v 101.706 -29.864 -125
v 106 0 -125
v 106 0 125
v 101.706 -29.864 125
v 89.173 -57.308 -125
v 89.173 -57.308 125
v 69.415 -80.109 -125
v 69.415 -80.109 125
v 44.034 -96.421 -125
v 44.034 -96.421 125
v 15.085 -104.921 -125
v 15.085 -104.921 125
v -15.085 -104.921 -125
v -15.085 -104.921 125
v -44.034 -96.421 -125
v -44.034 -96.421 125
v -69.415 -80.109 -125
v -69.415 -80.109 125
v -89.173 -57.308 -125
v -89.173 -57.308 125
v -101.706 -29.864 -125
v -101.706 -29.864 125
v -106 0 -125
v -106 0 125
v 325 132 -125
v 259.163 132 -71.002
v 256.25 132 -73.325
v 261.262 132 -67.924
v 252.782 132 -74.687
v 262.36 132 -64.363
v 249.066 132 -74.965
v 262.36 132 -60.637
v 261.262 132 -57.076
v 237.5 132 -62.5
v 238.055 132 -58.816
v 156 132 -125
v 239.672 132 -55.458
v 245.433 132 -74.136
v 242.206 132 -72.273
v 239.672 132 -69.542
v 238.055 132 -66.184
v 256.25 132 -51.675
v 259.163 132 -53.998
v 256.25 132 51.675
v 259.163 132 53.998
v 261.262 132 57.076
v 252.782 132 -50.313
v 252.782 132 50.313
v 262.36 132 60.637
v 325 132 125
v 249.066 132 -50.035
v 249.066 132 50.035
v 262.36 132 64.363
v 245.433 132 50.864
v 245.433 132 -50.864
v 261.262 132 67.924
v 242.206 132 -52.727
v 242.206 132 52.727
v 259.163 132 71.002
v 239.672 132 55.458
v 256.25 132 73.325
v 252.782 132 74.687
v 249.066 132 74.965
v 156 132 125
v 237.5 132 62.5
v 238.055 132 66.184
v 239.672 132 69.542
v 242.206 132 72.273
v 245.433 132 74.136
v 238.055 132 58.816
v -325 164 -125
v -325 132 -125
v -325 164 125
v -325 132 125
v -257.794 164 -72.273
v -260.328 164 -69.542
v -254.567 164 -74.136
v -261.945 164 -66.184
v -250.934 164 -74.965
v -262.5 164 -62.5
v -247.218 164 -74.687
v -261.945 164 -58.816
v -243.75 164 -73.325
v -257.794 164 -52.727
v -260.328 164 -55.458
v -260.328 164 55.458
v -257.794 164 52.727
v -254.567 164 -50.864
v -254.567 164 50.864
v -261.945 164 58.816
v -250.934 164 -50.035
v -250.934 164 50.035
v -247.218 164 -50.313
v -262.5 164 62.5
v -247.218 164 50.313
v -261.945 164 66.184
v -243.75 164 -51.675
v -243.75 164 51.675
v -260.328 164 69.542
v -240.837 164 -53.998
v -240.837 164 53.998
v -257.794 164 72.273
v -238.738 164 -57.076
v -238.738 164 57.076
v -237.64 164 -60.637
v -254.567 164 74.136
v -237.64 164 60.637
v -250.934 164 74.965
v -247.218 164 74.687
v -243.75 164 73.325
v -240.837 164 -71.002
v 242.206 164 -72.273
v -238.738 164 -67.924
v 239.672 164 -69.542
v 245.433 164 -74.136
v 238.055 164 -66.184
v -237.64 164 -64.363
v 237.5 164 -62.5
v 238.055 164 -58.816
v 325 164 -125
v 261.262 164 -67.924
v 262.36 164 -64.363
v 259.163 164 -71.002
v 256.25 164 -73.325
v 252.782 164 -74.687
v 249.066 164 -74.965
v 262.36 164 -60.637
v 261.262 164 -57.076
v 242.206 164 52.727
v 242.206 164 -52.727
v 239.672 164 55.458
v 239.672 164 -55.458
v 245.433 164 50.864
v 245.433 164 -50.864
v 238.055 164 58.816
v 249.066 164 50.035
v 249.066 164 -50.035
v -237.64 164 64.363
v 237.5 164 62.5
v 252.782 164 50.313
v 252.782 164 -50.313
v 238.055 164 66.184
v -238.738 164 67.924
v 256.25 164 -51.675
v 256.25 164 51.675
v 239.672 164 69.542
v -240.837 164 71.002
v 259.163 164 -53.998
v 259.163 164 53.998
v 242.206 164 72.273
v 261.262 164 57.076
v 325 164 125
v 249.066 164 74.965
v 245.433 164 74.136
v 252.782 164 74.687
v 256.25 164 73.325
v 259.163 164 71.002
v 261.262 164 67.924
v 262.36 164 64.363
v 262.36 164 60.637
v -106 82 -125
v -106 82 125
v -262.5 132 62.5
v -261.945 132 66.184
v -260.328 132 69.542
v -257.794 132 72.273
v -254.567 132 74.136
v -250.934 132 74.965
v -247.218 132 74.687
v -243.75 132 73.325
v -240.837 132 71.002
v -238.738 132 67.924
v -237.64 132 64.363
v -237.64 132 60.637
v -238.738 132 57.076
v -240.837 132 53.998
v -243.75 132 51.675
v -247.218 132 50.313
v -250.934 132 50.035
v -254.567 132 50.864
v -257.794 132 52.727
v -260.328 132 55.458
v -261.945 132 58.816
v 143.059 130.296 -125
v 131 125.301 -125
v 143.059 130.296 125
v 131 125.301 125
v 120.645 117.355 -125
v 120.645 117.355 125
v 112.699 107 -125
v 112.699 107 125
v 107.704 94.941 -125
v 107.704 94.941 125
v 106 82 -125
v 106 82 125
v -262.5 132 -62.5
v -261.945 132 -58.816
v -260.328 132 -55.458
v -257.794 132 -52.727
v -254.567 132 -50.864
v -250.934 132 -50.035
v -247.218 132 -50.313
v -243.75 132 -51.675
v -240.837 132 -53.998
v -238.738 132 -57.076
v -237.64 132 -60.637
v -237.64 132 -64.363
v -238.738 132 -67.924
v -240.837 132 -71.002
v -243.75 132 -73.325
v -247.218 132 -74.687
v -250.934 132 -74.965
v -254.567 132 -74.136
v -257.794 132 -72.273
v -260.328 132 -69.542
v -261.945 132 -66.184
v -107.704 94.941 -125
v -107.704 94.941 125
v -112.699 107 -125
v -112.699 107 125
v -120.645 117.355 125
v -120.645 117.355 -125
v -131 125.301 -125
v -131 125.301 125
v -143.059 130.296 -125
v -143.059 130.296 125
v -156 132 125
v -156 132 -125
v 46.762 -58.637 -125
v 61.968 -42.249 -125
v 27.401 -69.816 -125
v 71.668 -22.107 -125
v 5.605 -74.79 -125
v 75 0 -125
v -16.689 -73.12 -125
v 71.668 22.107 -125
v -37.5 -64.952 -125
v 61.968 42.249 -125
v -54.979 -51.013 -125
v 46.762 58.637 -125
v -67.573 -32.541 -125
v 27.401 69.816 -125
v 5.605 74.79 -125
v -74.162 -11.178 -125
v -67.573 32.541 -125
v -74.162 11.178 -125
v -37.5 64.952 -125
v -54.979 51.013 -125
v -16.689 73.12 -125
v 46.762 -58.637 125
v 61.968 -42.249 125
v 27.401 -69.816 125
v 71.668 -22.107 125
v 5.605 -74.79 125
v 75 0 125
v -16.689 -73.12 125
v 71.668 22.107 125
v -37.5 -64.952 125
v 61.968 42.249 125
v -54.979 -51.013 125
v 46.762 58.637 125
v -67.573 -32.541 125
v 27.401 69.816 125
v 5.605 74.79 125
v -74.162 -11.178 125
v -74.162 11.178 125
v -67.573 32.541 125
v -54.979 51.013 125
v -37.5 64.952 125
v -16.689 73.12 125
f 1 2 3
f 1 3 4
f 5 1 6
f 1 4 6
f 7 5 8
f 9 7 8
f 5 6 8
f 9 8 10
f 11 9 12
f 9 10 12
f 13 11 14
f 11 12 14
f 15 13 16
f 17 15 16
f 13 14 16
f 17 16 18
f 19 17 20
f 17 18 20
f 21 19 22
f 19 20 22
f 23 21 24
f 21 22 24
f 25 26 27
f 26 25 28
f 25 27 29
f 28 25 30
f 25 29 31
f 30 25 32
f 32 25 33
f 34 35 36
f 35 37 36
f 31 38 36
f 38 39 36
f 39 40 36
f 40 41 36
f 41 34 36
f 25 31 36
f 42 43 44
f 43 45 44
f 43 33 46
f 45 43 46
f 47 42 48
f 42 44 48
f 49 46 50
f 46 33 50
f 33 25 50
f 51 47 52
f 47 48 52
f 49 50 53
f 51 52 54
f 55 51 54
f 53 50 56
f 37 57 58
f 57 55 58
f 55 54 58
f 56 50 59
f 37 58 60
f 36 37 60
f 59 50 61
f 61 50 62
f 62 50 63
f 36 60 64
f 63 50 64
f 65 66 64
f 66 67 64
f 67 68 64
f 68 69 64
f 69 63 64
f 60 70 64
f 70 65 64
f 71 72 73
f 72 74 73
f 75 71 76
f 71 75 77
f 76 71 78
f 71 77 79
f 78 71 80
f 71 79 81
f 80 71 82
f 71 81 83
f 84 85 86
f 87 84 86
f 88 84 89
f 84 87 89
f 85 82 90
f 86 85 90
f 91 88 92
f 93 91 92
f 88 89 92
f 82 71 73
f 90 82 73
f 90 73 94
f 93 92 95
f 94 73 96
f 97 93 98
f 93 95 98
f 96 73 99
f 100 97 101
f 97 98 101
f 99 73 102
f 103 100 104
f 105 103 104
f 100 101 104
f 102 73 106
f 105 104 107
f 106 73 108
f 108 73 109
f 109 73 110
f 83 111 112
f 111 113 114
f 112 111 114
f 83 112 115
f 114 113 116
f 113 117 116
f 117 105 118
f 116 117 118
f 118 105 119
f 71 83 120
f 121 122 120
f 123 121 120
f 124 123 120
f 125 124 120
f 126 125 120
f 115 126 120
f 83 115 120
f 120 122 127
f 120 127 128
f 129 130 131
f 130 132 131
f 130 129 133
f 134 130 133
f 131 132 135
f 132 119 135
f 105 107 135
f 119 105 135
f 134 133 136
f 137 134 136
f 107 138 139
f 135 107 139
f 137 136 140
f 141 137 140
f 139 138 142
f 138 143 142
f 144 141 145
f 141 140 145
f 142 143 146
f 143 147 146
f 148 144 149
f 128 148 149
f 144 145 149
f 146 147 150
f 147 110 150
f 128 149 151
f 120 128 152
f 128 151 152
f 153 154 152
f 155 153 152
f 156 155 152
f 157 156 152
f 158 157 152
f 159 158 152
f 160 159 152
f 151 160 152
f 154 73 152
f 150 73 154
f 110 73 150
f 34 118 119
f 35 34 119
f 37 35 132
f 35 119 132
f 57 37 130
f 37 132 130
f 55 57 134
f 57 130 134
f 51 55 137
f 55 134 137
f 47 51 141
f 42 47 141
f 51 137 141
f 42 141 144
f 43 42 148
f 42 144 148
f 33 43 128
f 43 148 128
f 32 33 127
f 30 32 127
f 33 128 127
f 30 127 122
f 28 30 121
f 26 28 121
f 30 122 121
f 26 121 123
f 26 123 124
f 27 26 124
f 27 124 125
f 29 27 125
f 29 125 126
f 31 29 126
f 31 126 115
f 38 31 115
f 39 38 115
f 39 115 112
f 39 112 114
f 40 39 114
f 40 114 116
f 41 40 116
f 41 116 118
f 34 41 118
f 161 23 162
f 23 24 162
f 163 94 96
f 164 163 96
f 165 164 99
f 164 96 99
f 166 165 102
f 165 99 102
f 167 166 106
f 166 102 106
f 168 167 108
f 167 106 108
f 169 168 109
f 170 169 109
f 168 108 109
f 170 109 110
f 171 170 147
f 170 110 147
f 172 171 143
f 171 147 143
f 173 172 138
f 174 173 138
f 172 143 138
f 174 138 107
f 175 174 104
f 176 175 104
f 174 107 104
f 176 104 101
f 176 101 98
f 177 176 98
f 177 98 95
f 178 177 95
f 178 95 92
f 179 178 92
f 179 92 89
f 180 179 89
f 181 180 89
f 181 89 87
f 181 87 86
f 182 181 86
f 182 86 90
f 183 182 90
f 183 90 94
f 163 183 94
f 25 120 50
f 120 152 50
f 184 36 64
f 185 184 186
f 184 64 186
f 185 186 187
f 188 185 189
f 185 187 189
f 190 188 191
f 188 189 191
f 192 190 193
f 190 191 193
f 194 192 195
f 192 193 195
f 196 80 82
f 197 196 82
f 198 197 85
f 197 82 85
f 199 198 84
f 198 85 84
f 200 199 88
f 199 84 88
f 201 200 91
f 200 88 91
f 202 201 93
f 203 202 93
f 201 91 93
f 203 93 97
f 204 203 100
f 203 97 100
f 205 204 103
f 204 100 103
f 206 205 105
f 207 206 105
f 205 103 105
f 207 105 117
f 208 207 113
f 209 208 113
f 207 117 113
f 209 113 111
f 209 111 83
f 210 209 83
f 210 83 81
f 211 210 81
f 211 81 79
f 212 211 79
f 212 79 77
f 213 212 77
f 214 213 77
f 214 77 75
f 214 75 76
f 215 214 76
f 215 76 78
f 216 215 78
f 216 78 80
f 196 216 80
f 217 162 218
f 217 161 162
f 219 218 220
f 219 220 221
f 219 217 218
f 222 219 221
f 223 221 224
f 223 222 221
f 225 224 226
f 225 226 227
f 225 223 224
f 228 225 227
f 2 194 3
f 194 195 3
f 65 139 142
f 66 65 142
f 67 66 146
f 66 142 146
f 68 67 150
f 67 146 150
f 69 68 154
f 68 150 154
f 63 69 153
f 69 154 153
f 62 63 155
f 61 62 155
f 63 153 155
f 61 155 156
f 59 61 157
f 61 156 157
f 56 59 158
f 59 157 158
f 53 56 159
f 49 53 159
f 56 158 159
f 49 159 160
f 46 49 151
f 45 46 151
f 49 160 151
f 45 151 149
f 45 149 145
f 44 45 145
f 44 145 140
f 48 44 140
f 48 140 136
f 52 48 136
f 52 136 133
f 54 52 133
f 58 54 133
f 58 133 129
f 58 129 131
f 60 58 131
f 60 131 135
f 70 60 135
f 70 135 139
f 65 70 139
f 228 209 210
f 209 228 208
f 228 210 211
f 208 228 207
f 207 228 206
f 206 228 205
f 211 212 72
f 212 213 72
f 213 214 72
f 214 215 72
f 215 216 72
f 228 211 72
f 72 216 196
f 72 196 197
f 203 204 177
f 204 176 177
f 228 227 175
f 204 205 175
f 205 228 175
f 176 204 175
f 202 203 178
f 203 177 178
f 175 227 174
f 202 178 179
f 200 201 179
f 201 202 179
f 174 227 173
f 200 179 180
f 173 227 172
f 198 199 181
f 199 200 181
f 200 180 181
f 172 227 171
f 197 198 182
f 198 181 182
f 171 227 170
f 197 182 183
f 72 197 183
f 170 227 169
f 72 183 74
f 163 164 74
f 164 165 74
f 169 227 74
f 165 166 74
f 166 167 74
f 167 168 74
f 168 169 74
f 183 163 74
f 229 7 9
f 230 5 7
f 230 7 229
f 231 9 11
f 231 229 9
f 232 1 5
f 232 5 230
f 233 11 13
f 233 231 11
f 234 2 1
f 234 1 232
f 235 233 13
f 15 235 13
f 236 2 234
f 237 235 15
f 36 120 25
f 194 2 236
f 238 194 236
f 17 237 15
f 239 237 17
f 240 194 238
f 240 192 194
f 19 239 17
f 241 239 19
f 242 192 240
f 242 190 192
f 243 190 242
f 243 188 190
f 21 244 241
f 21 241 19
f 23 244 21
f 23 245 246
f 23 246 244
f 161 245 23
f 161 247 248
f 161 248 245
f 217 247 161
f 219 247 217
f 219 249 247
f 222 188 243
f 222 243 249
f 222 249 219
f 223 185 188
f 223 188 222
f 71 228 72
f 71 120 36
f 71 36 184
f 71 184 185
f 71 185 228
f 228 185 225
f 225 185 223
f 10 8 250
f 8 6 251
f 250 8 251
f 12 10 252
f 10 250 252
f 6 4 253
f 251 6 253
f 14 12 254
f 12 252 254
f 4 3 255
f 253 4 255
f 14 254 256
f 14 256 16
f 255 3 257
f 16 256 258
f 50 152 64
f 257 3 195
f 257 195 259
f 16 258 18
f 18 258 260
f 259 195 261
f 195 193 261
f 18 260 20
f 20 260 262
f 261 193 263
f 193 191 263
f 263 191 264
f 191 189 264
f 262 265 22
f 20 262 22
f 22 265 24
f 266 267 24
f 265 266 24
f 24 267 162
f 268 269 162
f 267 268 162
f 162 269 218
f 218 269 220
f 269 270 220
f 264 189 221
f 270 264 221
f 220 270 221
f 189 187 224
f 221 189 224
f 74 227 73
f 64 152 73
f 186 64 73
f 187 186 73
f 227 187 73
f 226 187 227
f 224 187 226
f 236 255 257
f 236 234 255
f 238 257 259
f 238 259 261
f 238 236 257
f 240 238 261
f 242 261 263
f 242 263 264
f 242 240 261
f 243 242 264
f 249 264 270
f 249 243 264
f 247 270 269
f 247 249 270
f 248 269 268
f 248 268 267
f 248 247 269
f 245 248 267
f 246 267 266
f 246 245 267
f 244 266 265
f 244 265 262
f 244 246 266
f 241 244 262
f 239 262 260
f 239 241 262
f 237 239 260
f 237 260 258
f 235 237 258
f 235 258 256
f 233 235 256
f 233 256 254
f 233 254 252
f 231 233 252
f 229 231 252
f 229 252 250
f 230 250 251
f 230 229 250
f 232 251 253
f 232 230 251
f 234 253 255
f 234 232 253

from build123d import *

# Parameters (mm, degrees)
SKETCH1_R           = 75
BOSS_EXTRUDE1_DEPTH = 125
FILLET1_R           = 50
SKETCH2_R           = 12.5
CUT_EXTRUDE1_DEPTH  = 441.624556737


with BuildPart() as part:
    # Sketch1 → Boss-Extrude1 (new, symmetric)
    with BuildSketch(Plane.XY):
        with BuildLine():
            Line((-106, 0), (-106, 132))
            Line((-106, 132), (-325, 132))
            Line((-325, 132), (-325, 164))
            Line((-325, 164), (325, 164))
            Line((325, 164), (325, 132))
            Line((325, 132), (106, 132))
            Line((106, 132), (106, 0))
            ThreePointArc((106, 0), (0, -106), (-106, 0))
        make_face()
        Circle(SKETCH1_R, mode=Mode.SUBTRACT)
    extrude(amount=BOSS_EXTRUDE1_DEPTH, both=True)

    # Fillet1
    fillet1_edges = [part.edges().sort_by_distance(p)[0] for p in [
        (106, 132, 0),
        (-106, 132, 0),
    ]]
    fillet(fillet1_edges, radius=FILLET1_R)

    # Sketch2 → Cut-Extrude1 (cut, through all)
    with BuildSketch(Plane(origin=(0, 164, 0), x_dir=(1, 0, 0), z_dir=(0, 1, 0))):
        with Locations(Location((-250, 62.5, 0), (0, 0, 180))):
            Circle(SKETCH2_R)
        with Locations(Location((-250, -62.5, 0), (0, 0, 180))):
            Circle(SKETCH2_R)
        with Locations(Location((250, -62.5, 0), (0, 0, 180))):
            Circle(SKETCH2_R)
        with Locations(Location((250, 62.5, 0), (0, 0, 180))):
            Circle(SKETCH2_R)
    extrude(amount=-CUT_EXTRUDE1_DEPTH, mode=Mode.SUBTRACT)


solid = part.part
